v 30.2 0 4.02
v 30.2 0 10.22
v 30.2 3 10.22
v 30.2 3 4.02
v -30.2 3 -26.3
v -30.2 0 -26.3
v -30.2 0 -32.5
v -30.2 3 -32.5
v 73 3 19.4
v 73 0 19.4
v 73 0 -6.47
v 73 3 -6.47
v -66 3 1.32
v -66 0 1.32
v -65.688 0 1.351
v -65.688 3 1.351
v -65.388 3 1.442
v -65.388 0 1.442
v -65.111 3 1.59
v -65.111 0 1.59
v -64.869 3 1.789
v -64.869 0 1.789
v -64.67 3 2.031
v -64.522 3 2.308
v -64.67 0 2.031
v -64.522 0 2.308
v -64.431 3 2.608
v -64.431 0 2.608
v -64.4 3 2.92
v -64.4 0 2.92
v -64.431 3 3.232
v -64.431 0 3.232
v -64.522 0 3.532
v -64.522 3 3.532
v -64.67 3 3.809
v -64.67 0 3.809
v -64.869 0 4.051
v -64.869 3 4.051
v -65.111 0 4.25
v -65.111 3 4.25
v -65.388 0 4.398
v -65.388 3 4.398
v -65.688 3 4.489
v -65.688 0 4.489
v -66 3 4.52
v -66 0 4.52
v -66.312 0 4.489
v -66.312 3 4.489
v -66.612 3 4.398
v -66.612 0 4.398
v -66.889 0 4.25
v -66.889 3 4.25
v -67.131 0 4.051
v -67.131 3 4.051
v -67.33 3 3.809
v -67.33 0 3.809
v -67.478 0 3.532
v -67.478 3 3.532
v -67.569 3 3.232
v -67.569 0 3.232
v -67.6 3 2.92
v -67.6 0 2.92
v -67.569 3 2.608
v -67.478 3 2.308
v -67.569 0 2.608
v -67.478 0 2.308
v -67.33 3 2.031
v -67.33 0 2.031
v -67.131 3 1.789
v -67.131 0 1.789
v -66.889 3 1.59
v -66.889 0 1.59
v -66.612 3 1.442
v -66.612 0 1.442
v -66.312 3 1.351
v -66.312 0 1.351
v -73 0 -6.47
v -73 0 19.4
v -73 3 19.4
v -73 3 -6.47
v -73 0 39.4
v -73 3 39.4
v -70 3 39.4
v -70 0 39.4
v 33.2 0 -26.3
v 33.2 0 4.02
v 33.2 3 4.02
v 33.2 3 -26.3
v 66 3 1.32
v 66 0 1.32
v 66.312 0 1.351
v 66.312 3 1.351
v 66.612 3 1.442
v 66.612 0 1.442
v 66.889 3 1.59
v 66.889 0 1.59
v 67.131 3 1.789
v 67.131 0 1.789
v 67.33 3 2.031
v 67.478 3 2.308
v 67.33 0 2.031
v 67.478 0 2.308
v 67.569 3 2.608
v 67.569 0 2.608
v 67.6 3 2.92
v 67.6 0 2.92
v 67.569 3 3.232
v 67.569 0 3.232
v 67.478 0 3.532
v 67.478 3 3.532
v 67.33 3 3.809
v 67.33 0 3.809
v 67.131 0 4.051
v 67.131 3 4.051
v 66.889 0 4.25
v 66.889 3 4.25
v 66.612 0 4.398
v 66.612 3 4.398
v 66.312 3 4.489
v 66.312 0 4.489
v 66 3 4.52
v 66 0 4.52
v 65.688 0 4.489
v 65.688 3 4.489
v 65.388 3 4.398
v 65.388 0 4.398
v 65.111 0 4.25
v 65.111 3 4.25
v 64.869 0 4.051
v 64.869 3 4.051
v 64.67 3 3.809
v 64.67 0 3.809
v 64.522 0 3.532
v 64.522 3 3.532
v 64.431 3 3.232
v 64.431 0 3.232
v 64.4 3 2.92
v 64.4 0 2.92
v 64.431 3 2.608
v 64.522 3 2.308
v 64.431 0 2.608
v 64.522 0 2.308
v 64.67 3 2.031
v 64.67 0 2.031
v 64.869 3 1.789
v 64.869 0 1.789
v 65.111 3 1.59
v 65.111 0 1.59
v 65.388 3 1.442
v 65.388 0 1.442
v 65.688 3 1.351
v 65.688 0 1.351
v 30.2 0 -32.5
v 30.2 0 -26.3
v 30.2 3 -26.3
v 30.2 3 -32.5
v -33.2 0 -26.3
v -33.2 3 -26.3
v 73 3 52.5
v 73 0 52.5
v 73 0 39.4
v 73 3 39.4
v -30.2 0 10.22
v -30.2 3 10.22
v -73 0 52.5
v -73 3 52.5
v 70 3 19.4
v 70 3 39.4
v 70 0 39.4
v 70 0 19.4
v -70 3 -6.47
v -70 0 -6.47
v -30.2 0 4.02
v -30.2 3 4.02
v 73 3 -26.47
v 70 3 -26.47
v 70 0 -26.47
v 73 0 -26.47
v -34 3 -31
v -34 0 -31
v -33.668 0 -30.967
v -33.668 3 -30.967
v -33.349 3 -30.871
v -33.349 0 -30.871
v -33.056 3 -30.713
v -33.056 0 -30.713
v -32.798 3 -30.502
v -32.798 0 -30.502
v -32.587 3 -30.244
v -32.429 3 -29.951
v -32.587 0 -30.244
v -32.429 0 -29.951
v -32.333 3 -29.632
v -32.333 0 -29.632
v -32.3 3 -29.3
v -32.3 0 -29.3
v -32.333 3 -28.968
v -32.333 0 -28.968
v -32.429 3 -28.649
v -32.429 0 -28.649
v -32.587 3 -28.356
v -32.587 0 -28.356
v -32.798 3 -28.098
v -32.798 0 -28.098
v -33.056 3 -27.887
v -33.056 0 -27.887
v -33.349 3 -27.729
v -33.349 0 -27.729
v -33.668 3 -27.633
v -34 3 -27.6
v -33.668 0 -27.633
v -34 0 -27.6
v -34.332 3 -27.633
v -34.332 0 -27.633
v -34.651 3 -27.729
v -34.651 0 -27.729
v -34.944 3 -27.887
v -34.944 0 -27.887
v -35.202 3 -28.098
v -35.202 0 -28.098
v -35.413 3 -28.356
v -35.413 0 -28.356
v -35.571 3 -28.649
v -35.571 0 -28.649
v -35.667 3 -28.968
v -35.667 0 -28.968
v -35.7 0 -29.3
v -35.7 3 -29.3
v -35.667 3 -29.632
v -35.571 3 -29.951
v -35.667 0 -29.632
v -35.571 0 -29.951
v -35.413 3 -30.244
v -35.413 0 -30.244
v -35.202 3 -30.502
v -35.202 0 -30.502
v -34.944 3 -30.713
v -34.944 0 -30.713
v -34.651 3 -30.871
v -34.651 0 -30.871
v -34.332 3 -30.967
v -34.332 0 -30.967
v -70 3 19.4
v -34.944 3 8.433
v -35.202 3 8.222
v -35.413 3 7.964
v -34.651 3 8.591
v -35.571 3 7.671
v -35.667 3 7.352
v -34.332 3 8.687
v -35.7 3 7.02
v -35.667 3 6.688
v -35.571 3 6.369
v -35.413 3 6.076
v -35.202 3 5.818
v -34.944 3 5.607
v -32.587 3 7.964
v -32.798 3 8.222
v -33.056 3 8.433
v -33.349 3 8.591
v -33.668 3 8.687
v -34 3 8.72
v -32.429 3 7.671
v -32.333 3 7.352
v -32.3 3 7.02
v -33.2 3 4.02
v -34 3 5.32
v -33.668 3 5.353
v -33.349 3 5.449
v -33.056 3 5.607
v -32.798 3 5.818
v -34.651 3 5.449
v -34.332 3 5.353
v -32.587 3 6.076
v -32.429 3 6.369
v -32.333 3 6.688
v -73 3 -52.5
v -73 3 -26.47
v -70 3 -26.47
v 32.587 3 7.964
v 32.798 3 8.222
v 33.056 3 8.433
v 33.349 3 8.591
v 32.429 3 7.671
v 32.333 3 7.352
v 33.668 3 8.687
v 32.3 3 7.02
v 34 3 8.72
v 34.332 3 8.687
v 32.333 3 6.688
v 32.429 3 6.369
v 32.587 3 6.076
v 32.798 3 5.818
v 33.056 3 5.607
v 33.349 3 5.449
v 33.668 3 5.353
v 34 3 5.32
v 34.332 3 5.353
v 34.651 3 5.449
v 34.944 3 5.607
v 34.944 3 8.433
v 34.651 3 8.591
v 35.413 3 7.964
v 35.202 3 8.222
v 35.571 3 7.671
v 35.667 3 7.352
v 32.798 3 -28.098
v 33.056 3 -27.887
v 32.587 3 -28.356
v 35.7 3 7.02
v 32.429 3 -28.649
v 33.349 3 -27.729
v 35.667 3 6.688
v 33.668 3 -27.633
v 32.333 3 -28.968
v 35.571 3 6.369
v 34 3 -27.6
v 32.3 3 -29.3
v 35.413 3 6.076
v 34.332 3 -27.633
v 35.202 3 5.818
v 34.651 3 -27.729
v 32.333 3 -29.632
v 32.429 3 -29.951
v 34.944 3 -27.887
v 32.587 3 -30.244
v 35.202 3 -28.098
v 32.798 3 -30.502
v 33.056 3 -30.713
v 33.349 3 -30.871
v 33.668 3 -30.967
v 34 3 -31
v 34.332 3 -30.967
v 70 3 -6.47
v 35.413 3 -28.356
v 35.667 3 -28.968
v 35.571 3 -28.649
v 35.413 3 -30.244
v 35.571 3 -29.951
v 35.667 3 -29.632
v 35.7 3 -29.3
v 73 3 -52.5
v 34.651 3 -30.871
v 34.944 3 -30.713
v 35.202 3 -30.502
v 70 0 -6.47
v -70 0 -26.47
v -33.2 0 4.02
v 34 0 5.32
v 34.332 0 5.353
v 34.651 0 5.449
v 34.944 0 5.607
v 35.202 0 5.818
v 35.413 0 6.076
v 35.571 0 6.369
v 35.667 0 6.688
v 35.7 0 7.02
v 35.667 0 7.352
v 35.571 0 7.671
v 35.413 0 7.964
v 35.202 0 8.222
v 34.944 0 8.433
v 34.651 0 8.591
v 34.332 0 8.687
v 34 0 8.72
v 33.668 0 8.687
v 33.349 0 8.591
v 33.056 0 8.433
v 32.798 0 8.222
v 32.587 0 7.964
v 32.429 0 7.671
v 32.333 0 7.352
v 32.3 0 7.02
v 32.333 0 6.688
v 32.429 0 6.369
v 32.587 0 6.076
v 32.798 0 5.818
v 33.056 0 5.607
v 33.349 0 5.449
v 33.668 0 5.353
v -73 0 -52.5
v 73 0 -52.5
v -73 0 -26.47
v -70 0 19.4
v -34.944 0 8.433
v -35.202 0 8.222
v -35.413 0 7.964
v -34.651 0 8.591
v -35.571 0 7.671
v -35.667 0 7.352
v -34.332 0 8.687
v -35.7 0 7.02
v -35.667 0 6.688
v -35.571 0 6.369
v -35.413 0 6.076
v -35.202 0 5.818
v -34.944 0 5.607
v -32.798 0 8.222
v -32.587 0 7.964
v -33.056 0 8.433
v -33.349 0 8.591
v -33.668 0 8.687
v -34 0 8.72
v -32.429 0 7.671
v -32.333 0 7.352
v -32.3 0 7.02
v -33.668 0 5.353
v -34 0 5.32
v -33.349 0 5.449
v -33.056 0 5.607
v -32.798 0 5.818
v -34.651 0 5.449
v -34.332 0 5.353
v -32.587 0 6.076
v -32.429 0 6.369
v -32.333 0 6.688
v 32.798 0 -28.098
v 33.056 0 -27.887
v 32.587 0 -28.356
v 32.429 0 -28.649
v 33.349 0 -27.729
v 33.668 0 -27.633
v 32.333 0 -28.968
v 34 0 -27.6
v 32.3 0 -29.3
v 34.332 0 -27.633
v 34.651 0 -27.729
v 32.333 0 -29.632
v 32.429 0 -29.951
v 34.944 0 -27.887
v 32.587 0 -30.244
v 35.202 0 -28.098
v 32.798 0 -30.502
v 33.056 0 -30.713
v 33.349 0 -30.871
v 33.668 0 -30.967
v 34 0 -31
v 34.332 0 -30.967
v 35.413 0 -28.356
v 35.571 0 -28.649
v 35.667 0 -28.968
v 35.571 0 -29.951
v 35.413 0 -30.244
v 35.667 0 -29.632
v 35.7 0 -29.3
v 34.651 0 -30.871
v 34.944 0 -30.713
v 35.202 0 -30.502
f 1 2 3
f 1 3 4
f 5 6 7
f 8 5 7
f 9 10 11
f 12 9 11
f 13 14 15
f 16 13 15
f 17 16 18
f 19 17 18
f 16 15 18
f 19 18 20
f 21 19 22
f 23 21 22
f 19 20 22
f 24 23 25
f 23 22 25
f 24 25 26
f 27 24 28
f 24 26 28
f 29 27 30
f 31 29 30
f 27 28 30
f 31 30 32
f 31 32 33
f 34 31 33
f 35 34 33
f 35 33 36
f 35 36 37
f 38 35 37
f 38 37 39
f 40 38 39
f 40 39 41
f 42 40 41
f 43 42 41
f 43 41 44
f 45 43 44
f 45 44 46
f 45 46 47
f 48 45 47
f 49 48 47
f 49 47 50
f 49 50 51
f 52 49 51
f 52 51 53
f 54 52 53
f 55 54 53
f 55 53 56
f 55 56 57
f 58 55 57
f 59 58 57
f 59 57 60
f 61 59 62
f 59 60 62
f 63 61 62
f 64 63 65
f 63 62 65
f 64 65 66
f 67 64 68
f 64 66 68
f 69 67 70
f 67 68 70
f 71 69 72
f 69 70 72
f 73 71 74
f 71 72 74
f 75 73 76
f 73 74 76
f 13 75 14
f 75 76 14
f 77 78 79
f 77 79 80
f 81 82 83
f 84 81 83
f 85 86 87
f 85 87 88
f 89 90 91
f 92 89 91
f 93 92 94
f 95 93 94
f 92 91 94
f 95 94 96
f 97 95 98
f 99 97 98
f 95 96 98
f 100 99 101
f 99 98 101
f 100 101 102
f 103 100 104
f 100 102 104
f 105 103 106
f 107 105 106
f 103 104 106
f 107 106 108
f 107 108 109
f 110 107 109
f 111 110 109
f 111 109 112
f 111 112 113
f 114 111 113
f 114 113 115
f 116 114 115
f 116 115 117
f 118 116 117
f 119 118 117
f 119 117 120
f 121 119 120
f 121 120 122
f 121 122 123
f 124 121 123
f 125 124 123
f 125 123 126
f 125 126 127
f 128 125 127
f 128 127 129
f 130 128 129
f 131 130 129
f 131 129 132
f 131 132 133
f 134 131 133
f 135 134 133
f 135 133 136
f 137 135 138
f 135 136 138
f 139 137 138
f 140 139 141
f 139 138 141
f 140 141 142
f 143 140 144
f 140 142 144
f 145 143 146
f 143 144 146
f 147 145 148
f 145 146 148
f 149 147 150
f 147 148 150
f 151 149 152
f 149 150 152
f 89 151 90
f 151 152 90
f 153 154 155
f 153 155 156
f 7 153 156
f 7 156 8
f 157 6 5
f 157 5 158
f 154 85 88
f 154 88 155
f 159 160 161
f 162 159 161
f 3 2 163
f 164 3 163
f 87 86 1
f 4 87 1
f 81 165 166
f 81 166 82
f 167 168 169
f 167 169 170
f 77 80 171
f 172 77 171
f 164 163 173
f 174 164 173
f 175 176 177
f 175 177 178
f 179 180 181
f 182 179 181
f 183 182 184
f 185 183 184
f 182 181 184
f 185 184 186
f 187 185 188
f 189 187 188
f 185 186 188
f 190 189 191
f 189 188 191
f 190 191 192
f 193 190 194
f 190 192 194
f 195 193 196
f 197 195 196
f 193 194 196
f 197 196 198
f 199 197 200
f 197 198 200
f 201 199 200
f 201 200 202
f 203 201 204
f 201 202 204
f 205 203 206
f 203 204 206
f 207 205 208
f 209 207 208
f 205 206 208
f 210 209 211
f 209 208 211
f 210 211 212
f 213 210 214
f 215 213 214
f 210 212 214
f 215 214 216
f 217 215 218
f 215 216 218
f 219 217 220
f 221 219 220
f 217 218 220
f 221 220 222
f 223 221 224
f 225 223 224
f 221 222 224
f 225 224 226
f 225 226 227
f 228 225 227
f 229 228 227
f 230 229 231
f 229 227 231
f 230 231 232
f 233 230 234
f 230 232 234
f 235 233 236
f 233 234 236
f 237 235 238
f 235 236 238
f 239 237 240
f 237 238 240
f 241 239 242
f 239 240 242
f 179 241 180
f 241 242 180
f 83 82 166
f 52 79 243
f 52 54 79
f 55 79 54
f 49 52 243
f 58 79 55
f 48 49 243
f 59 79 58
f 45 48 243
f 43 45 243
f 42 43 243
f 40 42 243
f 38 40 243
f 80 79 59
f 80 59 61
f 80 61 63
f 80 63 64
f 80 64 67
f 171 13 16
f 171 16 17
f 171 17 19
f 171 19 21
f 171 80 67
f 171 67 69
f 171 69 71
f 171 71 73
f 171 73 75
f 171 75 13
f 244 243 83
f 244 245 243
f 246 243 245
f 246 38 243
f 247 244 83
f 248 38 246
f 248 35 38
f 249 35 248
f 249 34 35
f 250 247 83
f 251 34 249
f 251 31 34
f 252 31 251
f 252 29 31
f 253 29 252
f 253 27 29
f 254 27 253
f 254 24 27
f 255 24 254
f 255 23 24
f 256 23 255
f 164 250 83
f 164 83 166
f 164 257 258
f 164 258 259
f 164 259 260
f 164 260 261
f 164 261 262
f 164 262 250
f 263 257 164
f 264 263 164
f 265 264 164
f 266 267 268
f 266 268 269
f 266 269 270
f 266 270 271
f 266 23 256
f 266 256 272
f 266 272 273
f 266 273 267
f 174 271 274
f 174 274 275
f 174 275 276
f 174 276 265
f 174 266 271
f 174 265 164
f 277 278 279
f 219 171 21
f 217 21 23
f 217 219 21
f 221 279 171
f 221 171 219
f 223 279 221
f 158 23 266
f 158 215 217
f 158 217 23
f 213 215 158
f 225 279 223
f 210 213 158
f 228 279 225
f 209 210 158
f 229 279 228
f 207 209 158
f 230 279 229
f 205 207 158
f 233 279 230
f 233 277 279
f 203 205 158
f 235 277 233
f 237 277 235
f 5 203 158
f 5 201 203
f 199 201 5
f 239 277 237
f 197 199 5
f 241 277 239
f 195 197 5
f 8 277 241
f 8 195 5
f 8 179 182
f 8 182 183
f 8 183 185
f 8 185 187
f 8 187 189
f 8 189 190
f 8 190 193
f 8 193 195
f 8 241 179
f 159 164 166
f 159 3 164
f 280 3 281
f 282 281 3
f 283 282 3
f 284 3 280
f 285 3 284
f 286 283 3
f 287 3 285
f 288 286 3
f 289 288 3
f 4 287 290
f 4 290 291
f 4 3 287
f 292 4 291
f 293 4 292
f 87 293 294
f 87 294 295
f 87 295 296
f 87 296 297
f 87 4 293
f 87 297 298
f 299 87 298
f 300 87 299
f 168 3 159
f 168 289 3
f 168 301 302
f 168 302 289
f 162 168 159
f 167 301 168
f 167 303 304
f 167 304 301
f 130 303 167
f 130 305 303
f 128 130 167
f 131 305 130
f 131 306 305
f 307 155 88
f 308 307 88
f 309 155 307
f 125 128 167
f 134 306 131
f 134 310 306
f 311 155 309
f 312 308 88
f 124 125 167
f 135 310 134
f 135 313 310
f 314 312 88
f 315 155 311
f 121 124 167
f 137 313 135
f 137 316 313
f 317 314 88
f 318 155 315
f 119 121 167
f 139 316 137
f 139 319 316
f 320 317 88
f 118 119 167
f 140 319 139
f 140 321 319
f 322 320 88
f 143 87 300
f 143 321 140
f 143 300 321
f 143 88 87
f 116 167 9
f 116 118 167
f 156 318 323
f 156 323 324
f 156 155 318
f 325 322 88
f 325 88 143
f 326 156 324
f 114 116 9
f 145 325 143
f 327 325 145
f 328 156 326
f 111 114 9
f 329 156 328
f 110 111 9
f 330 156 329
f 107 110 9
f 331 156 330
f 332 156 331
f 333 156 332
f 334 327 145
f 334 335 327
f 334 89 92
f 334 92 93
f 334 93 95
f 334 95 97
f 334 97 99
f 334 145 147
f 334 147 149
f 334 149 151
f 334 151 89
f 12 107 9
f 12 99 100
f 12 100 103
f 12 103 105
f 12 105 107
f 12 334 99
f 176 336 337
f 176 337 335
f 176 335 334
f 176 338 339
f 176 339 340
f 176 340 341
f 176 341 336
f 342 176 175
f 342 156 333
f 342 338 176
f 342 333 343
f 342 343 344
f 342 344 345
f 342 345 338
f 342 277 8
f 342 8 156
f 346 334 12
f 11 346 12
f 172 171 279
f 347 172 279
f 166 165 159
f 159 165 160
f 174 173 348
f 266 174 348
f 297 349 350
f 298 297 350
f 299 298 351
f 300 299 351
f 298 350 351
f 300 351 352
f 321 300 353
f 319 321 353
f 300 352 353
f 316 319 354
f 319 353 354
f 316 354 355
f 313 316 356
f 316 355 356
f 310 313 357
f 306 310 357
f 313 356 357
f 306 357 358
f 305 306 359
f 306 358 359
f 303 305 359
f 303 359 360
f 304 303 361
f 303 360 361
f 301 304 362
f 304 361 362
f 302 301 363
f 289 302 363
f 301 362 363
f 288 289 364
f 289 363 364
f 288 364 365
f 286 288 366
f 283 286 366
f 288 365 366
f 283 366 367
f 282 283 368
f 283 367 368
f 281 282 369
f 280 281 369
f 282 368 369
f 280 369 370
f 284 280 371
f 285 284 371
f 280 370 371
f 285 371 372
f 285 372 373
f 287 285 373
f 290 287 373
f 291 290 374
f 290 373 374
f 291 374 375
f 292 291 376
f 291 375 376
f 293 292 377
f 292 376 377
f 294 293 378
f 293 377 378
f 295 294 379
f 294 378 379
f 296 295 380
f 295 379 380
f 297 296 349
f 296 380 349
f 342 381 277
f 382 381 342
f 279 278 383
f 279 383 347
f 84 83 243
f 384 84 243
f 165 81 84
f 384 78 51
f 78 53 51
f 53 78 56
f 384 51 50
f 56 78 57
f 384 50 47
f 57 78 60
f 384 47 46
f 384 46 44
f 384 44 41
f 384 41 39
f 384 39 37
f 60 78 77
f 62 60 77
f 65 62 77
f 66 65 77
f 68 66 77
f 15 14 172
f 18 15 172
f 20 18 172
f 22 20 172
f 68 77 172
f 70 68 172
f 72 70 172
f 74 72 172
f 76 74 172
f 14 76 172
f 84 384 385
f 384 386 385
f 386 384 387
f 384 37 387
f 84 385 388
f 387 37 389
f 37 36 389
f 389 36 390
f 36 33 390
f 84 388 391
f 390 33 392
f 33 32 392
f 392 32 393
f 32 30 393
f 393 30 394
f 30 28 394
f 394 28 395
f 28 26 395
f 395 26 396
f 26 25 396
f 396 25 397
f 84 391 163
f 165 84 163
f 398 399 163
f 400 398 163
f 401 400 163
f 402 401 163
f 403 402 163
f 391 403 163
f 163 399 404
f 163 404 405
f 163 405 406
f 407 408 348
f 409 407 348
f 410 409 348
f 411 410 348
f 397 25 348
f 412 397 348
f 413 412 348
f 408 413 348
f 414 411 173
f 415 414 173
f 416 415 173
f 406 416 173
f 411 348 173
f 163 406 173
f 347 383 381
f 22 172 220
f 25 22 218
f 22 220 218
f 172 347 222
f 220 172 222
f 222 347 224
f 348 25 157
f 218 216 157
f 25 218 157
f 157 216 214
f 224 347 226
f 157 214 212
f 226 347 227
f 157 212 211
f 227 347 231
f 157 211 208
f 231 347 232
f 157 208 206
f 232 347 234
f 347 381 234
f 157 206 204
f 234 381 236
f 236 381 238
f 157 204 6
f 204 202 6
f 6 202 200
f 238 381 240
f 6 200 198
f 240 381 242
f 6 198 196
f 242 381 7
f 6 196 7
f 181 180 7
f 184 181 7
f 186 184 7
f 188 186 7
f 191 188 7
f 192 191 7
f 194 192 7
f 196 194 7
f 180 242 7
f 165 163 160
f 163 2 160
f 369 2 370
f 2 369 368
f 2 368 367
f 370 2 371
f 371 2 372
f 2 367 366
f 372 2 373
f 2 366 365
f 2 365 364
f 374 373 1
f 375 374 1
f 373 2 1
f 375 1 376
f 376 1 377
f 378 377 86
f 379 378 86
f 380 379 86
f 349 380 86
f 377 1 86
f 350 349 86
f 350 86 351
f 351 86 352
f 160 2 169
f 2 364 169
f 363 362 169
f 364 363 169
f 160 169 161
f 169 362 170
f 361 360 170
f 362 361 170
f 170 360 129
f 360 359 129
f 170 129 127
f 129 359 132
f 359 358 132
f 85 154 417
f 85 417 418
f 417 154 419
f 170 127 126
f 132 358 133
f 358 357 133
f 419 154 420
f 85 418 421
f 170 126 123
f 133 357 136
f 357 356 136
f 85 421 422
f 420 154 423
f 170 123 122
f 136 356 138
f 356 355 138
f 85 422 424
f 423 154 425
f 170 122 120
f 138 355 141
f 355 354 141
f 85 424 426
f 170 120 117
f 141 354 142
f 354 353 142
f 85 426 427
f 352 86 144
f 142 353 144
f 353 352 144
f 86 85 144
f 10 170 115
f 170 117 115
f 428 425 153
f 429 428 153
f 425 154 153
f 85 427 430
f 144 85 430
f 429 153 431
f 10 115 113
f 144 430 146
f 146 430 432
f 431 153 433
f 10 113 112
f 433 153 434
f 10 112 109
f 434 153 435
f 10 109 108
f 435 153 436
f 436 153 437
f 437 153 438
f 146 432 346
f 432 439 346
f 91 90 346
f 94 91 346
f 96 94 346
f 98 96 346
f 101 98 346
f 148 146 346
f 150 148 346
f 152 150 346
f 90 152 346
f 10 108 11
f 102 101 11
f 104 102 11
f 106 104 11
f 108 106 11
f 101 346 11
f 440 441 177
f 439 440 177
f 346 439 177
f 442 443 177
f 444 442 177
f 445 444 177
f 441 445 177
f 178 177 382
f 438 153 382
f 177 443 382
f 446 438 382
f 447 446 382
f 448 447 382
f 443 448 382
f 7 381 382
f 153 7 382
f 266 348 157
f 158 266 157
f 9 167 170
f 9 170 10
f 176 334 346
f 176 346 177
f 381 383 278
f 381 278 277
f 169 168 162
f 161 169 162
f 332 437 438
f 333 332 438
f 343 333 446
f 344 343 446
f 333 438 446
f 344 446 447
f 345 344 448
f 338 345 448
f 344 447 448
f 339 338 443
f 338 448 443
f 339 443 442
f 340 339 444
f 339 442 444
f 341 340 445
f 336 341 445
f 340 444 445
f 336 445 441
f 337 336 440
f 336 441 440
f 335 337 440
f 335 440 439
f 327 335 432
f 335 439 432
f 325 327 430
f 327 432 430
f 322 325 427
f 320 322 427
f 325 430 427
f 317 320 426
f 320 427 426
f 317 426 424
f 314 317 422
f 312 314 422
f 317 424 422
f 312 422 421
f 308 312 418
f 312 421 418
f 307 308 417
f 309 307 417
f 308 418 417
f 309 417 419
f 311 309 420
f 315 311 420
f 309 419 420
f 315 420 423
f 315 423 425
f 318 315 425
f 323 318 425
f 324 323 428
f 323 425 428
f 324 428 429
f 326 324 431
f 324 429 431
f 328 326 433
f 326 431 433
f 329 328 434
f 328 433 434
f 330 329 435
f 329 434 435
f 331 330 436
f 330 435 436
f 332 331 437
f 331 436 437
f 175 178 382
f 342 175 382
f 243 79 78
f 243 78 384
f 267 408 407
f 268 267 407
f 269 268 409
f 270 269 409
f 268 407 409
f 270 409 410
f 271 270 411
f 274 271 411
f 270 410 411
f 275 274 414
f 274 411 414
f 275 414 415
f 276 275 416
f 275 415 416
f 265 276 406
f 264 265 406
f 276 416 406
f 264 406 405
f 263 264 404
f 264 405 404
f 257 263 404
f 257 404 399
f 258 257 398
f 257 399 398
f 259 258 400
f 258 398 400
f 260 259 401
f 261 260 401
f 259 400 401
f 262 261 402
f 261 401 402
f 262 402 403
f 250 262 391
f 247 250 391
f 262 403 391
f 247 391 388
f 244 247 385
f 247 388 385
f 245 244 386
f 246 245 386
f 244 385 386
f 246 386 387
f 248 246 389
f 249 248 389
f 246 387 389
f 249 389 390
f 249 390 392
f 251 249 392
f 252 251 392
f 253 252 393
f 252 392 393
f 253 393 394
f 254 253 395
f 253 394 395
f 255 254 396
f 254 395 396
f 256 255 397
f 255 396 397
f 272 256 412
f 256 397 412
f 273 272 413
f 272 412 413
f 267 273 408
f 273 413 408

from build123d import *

# Parameters (mm, degrees)
SKETCH1_W           = 146
SKETCH1_H           = 105
BOSS_EXTRUDE1_DEPTH = 3
SKETCH2_W           = 3
SKETCH2_H           = 20
CUT_EXTRUDE1_DEPTH  = 10
SKETCH3_R           = 1.7
SKETCH3_W           = 60.4
SKETCH3_H           = 42.72
CUT_EXTRUDE2_DEPTH  = 3
SKETCH5_W           = 3
SKETCH5_H           = 30.32
CUT_EXTRUDE4_DEPTH  = 90.968049884
SKETCH6_R           = 1.6
CUT_EXTRUDE5_DEPTH  = 10


with BuildPart() as part:
    # Sketch1 → Boss-Extrude1 (new body)
    with BuildSketch(Plane(origin=(0, 0, 0), x_dir=(1, 0, 0), z_dir=(0, 1, 0))):
        Rectangle(SKETCH1_W, SKETCH1_H)
    extrude(amount=BOSS_EXTRUDE1_DEPTH)

    # Sketch2 → Cut-Extrude1 (cut)
    with BuildSketch(Plane(origin=(0, 3, 0), x_dir=(1, 0, 0), z_dir=(0, 1, 0))):
        with Locations((-71.5, 16.47)):
            Rectangle(SKETCH2_W, SKETCH2_H)
        with Locations((71.5, 16.47)):
            Rectangle(SKETCH2_W, SKETCH2_H)
        with Locations((-71.5, -29.4)):
            Rectangle(SKETCH2_W, SKETCH2_H)
        with Locations((71.5, -29.4)):
            Rectangle(SKETCH2_W, SKETCH2_H)
    extrude(amount=-CUT_EXTRUDE1_DEPTH, mode=Mode.SUBTRACT)

    # Sketch3 → Cut-Extrude2 (cut)
    with BuildSketch(Plane(origin=(0, 0, 0), x_dir=(-1, 0, 0), z_dir=(0, -1, 0))):
        with Locations(Location((-34, 29.3, 0), (0, 0, 90))):
            Circle(SKETCH3_R)
        with Locations(Location((-34, -7.02, 0), (0, 0, 90))):
            Circle(SKETCH3_R)
        with Locations(Location((34, 29.3, 0), (0, 0, 90))):
            Circle(SKETCH3_R)
        with Locations(Location((34, -7.02, 0), (0, 0, 90))):
            Circle(SKETCH3_R)
        with Locations((0, 11.14)):
            Rectangle(SKETCH3_W, SKETCH3_H)
    extrude(amount=-CUT_EXTRUDE2_DEPTH, mode=Mode.SUBTRACT)

    # Sketch5 → Cut-Extrude4 (cut, through all)
    with BuildSketch(Plane(origin=(0, 0, 0), x_dir=(-1, 0, 0), z_dir=(0, -1, 0))):
        with Locations((31.7, 11.14)):
            Rectangle(SKETCH5_W, SKETCH5_H)
        with Locations((-31.7, 11.14)):
            Rectangle(SKETCH5_W, SKETCH5_H)
    extrude(amount=-CUT_EXTRUDE4_DEPTH, mode=Mode.SUBTRACT)

    # Sketch6 → Cut-Extrude5 (cut)
    with BuildSketch(Plane.XZ):
        with Locations(Location((-66, 2.92, 0), (0, 0, 270))):
            Circle(SKETCH6_R)
        with Locations(Location((66, 2.92, 0), (0, 0, 270))):
            Circle(SKETCH6_R)
    extrude(amount=-CUT_EXTRUDE5_DEPTH, mode=Mode.SUBTRACT)


solid = part.part
